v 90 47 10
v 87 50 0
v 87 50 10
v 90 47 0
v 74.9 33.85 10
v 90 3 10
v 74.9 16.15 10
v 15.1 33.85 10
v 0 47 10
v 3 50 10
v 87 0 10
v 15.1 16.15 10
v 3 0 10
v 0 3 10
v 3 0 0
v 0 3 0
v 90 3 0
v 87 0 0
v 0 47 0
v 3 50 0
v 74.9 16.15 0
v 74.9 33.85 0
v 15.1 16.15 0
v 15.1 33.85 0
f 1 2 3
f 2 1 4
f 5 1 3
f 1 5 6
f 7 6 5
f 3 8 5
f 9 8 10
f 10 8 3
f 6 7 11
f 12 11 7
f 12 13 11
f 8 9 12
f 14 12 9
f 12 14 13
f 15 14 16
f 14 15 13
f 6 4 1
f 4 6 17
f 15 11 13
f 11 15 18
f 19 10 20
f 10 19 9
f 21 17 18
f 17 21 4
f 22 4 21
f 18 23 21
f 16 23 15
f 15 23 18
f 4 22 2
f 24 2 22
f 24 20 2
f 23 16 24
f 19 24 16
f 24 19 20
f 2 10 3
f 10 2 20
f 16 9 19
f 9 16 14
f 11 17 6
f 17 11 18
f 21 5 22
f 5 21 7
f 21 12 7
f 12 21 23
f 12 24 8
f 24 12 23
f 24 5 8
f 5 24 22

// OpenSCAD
$fn = 32;

// ----------------------------------------------------------------------
// Windowed plate: 1 voids, 90 x 50 x 10 mm
// ----------------------------------------------------------------------

// --- parameters (mm) ---
plate_l = 90;             // plate length, X
plate_w = 50;             // plate width, Y
plate_t = 10;             // plate thickness, Z
edge_margin = 12;         // wall from the plate edge to any window
win1_l = 59.8;            // window length
win1_w = 17.7;            // window width
depth_1 = 10;             // depth of void 1 (full thickness = through)
corner_c = 3;             // corner chamfer of the plate

profile = [[3, 0], [87, 0], [90, 3], [90, 47], [87, 50], [3, 50], [0, 47], [0, 3]];  // primary outline, 8 points, counter clockwise
void_1 = [[15.1, 16.15], [74.9, 16.15], [74.9, 33.85], [15.1, 33.85]];  // large central window, 4 points

// --- the one profile operation ---
difference() {
  linear_extrude(height = plate_t) polygon(points = profile);
  translate([0, 0, -1])
    linear_extrude(height = plate_t + 2) polygon(points = void_1);
}
